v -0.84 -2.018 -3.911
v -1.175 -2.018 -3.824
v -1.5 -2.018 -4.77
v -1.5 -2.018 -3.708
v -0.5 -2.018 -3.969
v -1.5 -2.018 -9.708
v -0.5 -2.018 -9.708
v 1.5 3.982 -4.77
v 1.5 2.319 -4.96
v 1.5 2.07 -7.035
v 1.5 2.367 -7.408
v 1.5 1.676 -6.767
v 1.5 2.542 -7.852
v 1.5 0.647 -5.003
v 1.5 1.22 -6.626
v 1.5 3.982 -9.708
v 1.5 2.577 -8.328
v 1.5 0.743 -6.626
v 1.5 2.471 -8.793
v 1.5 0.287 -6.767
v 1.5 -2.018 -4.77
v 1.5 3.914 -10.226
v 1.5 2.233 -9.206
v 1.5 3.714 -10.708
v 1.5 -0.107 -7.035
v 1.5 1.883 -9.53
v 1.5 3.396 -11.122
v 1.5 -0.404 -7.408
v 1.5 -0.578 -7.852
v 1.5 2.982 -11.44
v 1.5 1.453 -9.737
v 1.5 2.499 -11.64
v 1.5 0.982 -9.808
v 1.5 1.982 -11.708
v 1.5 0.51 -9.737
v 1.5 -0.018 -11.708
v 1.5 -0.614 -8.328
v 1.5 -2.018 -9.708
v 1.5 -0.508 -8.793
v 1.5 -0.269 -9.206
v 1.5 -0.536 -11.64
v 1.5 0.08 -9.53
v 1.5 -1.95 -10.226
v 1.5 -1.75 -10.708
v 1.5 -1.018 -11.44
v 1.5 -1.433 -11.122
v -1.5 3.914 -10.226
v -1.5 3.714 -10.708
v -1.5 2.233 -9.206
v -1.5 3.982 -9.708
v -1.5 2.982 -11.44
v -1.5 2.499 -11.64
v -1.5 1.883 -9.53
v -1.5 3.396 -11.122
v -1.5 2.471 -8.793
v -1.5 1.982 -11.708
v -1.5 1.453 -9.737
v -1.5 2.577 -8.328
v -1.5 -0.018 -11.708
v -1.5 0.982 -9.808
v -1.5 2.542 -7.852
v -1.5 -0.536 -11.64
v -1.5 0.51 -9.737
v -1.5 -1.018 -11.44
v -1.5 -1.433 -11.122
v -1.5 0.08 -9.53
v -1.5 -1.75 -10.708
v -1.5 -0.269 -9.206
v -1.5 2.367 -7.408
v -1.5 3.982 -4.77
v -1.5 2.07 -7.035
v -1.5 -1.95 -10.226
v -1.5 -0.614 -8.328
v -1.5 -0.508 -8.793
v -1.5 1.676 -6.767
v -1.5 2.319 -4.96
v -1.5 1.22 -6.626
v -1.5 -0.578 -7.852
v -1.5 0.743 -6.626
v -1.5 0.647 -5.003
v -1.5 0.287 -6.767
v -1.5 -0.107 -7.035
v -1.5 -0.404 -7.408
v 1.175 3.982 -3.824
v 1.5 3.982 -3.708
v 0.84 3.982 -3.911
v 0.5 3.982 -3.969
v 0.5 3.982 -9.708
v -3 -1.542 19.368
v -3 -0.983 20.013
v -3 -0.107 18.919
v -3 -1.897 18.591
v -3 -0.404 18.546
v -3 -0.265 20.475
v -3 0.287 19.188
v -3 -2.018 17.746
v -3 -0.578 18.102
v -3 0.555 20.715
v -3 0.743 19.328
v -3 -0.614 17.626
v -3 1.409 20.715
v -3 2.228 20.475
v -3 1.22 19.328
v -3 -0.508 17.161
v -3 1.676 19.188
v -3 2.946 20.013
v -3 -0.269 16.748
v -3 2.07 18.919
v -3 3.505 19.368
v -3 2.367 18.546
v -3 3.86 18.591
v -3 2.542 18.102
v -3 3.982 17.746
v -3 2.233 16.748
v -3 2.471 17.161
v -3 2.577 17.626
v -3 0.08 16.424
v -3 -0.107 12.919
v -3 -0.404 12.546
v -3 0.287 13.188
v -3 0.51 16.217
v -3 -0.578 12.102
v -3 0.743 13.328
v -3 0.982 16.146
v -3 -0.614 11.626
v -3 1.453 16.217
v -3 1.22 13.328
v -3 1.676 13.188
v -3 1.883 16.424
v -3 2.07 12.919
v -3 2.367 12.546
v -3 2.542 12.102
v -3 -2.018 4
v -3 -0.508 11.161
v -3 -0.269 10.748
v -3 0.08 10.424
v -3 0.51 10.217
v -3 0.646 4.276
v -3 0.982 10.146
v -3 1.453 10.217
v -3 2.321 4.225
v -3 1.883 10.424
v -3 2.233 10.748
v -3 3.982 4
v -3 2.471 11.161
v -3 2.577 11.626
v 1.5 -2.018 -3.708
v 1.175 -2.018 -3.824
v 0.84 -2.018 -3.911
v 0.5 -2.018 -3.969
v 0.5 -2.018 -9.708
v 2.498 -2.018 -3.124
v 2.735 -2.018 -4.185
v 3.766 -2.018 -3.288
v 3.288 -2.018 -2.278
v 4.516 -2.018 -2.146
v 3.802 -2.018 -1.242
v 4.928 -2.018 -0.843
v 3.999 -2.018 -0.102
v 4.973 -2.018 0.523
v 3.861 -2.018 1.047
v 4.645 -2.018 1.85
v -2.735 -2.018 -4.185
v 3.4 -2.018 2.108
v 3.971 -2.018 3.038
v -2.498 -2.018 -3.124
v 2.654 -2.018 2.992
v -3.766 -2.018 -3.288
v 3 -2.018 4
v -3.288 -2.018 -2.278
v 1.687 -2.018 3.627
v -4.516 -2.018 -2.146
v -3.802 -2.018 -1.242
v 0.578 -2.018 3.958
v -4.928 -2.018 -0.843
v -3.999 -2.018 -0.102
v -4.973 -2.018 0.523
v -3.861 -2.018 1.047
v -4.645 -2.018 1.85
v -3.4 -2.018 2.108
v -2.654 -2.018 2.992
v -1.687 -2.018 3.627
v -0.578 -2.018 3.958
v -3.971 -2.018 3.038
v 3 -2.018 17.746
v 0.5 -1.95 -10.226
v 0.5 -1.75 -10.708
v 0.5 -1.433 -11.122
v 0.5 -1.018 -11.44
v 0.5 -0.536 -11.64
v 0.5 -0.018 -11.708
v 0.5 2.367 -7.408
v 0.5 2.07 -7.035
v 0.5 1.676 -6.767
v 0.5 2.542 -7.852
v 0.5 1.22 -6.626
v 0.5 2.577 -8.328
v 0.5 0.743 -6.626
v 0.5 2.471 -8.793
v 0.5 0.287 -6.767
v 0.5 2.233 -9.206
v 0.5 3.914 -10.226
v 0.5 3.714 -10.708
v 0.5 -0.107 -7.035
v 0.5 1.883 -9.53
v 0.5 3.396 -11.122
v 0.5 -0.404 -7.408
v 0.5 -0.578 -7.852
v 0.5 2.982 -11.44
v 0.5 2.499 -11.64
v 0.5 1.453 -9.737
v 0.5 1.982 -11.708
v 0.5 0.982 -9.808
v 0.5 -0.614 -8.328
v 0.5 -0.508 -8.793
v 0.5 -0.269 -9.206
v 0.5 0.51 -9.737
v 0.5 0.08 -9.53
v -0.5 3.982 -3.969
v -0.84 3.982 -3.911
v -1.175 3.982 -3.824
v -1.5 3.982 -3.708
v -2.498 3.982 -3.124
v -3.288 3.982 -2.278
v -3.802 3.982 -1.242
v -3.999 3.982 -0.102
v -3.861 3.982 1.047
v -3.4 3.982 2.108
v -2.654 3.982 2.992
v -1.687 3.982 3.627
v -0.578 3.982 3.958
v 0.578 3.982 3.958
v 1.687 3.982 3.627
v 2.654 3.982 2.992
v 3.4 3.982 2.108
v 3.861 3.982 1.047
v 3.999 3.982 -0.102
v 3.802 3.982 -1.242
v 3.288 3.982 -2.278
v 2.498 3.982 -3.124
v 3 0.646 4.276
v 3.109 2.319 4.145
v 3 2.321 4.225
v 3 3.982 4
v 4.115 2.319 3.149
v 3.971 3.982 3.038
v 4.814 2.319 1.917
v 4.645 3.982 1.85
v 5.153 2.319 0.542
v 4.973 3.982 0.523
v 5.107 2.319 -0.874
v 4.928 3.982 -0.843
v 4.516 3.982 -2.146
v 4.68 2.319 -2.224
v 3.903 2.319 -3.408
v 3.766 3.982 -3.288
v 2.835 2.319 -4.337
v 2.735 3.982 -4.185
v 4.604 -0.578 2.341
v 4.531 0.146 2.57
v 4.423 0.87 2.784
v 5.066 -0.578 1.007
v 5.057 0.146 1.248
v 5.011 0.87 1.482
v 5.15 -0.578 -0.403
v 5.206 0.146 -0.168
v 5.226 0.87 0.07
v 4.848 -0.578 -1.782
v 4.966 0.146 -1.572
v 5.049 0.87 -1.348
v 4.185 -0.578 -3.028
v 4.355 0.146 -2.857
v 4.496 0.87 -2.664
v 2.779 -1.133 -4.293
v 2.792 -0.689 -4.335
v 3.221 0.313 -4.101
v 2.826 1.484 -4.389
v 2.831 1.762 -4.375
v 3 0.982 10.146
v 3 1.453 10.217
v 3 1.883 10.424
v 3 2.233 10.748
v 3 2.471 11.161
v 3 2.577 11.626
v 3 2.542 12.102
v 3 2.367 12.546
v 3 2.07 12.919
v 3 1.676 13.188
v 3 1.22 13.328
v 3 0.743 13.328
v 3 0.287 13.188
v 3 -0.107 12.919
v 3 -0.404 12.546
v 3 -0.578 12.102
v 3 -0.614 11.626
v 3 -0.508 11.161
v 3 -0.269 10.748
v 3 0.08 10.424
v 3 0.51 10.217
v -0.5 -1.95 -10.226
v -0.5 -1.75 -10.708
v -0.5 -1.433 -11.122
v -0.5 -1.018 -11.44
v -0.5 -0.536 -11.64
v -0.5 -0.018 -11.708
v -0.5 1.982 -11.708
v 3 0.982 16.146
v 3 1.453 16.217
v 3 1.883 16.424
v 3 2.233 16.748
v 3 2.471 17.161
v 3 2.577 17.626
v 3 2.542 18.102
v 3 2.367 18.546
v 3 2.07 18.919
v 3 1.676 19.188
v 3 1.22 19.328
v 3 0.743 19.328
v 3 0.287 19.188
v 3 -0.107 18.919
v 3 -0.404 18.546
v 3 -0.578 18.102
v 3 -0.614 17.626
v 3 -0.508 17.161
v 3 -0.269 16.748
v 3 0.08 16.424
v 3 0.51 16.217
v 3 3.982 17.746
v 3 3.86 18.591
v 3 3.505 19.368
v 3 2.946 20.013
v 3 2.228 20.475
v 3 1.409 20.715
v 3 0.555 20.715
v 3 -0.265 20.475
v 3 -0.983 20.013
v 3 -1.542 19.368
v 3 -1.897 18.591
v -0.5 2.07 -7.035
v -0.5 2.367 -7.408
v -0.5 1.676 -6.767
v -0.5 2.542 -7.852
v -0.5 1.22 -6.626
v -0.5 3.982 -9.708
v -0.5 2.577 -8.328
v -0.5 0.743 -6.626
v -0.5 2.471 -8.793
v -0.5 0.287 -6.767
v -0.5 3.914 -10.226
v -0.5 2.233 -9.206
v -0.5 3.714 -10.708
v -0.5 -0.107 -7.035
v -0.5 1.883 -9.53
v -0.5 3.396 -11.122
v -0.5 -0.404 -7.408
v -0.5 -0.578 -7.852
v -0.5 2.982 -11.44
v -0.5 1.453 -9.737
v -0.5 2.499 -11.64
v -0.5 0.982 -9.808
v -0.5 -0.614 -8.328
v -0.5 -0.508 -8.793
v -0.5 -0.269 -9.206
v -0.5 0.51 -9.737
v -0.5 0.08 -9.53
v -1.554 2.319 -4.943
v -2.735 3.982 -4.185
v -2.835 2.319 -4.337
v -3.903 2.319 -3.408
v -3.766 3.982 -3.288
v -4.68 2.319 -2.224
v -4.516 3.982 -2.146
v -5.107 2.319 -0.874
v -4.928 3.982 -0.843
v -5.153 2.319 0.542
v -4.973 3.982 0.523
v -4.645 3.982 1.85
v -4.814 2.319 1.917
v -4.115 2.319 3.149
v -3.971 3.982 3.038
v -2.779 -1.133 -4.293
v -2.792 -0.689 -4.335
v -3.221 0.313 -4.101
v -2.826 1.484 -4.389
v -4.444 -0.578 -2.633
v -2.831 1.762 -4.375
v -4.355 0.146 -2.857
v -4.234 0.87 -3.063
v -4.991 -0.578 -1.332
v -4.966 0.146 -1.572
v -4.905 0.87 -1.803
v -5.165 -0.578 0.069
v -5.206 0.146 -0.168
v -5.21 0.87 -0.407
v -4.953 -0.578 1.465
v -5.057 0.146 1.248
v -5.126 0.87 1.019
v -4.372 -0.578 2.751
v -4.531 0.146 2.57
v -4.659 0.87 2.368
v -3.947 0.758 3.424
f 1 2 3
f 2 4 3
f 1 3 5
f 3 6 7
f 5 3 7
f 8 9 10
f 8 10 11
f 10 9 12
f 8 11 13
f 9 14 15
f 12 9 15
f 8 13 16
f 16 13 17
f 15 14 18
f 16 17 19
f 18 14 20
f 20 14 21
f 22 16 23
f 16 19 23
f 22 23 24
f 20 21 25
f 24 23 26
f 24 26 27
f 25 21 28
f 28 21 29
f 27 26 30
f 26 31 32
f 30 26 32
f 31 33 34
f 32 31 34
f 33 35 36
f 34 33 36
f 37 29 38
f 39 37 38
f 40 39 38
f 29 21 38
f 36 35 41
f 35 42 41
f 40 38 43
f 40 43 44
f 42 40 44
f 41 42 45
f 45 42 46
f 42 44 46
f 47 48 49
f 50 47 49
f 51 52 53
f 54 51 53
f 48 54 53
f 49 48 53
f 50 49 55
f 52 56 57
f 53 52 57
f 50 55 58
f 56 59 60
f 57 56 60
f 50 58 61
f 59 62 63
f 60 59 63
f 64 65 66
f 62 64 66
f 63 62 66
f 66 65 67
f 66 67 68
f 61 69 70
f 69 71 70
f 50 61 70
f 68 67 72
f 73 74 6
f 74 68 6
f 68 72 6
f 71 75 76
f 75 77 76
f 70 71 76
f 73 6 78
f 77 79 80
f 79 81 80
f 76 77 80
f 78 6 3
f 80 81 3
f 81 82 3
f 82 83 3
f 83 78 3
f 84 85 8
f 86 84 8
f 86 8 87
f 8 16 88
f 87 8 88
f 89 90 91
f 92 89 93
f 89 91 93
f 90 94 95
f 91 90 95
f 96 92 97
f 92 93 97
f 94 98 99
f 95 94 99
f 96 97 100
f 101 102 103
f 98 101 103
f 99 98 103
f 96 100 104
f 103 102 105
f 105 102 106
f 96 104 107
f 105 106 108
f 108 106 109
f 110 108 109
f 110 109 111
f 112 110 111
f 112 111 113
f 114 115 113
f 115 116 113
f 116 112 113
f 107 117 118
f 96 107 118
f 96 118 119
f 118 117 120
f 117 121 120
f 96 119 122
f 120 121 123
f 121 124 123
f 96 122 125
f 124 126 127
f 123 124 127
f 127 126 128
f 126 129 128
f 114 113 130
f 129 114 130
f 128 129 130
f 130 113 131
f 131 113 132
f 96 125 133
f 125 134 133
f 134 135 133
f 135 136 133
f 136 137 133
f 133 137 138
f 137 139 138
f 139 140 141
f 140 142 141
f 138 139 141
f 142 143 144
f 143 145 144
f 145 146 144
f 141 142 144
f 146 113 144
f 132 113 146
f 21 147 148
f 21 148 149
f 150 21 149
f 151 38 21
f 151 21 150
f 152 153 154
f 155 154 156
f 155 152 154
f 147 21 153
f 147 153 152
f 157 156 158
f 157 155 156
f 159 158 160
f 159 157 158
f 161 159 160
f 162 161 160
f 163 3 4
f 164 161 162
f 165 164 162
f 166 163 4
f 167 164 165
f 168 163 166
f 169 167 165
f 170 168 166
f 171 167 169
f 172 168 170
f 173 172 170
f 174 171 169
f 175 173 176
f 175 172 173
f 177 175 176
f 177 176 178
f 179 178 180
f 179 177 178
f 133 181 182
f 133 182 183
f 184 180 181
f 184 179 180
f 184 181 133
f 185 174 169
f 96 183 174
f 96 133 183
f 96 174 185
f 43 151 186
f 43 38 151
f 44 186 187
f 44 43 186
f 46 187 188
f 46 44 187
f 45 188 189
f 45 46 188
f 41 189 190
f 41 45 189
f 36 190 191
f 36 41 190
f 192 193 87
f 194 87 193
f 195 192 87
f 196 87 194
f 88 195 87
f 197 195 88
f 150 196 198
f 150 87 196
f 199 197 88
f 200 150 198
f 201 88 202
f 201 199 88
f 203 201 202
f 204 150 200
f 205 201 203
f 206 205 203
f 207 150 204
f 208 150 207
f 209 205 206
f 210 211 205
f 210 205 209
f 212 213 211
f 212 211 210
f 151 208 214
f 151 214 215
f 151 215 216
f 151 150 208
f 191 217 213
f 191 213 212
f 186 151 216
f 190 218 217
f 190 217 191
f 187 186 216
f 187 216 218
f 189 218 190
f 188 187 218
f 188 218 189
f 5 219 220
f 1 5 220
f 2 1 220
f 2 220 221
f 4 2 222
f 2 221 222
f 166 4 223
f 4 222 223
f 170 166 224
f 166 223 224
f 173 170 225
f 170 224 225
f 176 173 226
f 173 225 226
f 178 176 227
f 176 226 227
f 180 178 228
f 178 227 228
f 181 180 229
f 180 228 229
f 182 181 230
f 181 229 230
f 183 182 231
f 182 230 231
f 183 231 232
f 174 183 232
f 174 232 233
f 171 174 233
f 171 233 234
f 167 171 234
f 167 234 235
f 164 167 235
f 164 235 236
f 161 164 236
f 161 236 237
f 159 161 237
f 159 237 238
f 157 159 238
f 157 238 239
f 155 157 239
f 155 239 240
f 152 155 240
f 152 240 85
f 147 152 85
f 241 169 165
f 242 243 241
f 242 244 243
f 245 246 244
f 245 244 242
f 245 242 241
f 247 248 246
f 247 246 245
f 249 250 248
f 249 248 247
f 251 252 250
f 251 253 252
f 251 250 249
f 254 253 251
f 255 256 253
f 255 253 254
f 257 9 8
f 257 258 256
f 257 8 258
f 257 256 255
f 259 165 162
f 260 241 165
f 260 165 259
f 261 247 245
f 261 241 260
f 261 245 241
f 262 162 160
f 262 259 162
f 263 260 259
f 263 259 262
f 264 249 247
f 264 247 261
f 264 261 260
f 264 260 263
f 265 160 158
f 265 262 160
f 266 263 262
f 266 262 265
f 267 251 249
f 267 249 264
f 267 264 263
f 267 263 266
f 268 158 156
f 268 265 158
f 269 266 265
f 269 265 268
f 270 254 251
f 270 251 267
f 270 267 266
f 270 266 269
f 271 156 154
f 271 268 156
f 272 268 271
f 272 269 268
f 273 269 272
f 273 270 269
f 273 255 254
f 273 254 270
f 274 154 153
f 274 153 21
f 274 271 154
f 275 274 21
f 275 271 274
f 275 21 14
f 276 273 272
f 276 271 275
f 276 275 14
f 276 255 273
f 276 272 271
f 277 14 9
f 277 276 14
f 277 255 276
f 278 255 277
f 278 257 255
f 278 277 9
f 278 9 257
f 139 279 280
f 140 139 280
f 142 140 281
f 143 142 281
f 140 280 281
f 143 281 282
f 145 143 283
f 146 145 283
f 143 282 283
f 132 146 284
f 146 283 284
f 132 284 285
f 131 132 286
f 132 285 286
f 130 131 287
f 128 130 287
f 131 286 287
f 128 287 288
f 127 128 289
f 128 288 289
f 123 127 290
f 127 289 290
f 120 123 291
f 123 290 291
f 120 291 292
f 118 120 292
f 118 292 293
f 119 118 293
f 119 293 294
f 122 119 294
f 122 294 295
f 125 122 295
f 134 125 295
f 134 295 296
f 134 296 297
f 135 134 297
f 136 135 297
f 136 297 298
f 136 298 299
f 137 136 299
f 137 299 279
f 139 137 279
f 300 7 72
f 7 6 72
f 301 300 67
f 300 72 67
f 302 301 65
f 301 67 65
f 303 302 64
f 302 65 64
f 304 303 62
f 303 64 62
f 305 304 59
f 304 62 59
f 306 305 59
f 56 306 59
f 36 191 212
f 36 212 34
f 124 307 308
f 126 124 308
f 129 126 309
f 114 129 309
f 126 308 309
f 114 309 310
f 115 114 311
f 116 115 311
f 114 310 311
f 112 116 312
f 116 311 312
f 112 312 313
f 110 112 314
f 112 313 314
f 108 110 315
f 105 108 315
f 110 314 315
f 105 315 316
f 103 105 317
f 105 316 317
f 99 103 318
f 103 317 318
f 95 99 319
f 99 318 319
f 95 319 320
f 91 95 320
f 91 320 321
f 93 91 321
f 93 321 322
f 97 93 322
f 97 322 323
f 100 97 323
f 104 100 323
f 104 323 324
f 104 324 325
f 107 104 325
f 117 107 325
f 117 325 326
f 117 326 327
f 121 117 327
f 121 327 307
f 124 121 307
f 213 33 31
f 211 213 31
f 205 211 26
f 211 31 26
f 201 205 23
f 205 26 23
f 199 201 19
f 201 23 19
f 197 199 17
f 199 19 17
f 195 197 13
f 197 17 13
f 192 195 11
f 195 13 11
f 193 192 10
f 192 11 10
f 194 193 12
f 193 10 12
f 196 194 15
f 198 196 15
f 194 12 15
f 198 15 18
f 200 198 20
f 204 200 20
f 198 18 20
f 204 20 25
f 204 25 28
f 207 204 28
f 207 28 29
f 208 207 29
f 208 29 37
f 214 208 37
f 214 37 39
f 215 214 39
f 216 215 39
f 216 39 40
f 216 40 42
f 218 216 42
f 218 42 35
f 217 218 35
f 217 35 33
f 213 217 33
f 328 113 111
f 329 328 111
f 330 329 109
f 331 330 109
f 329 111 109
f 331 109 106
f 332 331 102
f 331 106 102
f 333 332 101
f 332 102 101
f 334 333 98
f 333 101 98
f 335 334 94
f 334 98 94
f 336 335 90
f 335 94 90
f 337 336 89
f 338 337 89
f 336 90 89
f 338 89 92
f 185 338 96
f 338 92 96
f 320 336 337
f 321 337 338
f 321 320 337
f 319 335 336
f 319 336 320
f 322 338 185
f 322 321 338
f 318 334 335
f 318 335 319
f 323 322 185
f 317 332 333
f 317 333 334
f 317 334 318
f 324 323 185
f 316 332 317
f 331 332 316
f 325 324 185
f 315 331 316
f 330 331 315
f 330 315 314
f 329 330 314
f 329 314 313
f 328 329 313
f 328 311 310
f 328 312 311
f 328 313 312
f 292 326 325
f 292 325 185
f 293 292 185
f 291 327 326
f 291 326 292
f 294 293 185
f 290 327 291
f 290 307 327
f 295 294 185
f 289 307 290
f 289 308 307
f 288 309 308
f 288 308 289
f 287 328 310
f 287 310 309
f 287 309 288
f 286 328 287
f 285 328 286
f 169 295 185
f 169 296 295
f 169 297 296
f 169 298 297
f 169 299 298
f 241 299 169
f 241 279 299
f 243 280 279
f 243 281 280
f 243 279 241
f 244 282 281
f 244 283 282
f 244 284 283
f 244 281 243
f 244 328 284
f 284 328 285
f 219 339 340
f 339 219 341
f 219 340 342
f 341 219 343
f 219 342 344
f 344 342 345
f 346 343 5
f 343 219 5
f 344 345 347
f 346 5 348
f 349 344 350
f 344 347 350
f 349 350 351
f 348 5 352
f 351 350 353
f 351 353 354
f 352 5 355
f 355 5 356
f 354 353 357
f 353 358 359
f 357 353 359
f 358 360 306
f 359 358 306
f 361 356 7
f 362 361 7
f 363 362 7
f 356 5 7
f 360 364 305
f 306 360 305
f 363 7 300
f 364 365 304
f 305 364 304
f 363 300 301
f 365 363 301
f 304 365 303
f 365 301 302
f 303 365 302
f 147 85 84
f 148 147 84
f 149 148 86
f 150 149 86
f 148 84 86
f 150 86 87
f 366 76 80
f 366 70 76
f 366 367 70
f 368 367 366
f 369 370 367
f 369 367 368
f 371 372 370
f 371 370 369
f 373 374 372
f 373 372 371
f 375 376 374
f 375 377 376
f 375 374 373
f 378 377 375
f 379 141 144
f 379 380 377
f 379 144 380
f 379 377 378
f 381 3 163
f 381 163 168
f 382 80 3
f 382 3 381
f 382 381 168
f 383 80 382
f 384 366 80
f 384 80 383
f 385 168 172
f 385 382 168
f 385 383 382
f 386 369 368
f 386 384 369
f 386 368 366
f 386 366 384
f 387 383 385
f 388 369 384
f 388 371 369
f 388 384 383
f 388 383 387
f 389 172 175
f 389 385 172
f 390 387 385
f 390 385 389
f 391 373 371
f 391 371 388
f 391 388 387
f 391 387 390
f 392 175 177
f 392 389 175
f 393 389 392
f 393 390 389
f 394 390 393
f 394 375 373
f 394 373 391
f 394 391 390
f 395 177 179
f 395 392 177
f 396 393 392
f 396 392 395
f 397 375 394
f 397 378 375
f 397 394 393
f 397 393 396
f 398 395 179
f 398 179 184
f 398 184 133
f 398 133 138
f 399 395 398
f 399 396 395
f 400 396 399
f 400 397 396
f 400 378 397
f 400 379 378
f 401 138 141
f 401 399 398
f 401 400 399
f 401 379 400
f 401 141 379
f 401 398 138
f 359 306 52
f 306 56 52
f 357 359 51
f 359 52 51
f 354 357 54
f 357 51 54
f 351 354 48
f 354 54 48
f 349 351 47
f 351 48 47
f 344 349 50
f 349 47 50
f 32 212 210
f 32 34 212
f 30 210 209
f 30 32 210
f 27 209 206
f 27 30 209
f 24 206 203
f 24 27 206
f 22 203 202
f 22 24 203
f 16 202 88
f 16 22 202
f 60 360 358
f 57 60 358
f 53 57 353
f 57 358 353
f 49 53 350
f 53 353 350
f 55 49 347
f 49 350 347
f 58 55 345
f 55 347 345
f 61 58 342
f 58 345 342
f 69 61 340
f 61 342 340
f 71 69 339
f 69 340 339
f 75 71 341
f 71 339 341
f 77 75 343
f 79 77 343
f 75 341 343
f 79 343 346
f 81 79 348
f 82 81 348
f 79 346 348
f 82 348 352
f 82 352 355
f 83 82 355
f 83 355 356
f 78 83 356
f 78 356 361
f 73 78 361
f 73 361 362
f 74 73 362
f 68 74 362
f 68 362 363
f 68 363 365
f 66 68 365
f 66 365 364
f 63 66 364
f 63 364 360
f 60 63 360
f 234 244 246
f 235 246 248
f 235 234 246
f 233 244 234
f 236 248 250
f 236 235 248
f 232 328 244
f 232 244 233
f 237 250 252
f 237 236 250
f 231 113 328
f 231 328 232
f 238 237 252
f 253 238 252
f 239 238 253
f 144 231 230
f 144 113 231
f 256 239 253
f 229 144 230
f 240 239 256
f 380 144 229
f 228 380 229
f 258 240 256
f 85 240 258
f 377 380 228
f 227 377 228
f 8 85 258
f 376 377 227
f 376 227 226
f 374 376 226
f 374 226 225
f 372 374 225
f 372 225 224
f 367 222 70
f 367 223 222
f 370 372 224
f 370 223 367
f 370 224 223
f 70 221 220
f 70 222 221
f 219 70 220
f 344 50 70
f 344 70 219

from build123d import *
from OCP.BRepAlgoAPI import BRepAlgoAPI_Cut
from OCP.TopTools import TopTools_ListOfShape

# Parameters (mm, degrees)
CUT_EXTRUDE_1_DEPTH      = 9.395352378
CUT_EXTRUDE_1_DEPTH_BACK = 9.395352378
SKETCH_2_W               = 3
SKETCH_2_H               = 3.541131468
EXTRUDE_START            = -2.0183
EXTRUDE_1_DEPTH          = 6
EXTRUDE_2_DEPTH          = 3
EXTRUDE_2_DEPTH_BACK     = 3
SKETCH_6_R               = 1.6
CUT_EXTRUDE_2_DEPTH      = 23.66980552
SKETCH_7_R               = 4
CUT_EXTRUDE_3_DEPTH      = 23.219551454
FILLET_1_R               = 2


with BuildPart() as part:
    # 草图1 → 旋转1 (revolve)
    with BuildSketch(Plane.XY, mode=Mode.PRIVATE) as revolve_1_sk:
        with BuildLine():
            Line((4, 3.981699636), (4, -2.018300364))
            Line((4, -2.018300364), (5, -2.018300364))
            ThreePointArc((5, -2.018300364), (5.226280067, 0.981699636), (5, 3.981699636))
            Line((5, 3.981699636), (4, 3.981699636))
        make_face()
    revolve(revolve_1_sk.sketch.rotate(Axis((0, -4.923271421, 0), (0, 1, 0)), 90), axis=Axis((0, -4.923271421, 0), (0, 1, 0)))

    # 草图2 → 切除-拉伸1 (cut, two sides: drawn at the far end of the back side and taken through both)
    with BuildSketch(Plane(origin=(0, 0, 0), x_dir=(1, 0, 0), z_dir=(0, 1, 0)).offset(-CUT_EXTRUDE_1_DEPTH_BACK)):
        with Locations((0, 5.060025588)):
            Rectangle(SKETCH_2_W, SKETCH_2_H)
    extrude(amount=CUT_EXTRUDE_1_DEPTH + CUT_EXTRUDE_1_DEPTH_BACK, mode=Mode.SUBTRACT)

    # 草图3 → 凸台-拉伸1 (add)
    with BuildSketch(Plane(origin=(0, 0, 0), x_dir=(1, 0, 0), z_dir=(0, 1, 0)).offset(EXTRUDE_START)):
        Polygon((-1.5, 3.708099244), (-0.5, 3.708099244), (-0.5, 11.708099244), (-1.5, 11.708099244), (-1.5, 4.981969012), align=None)
        Polygon((1.5, 11.708099244), (1.5, 4.981969012), (1.5, 3.708099244), (0.5, 3.708099244), (0.5, 11.708099244), align=None)
    extrude(amount=EXTRUDE_1_DEPTH)

    # 草图5 → 凸台-拉伸2 (add, two sides: drawn at the far end of the back side and taken through both)
    with BuildSketch(Plane(origin=(0, 0, 0), x_dir=(0, 0, -1), z_dir=(1, 0, 0)).offset(-EXTRUDE_2_DEPTH_BACK)):
        with BuildLine():
            Line((-3.745950378, 3.981699636), (-17.745950378, 3.981699636))
            ThreePointArc((-17.745950378, 3.981699636), (-20.745950378, 0.981699636), (-17.745950378, -2.018300364))
            Line((-17.745950378, -2.018300364), (-3.745950378, -2.018300364))
            Line((-3.745950378, -2.018300364), (-3.745950378, 3.981699636))
        make_face()
    extrude(amount=EXTRUDE_2_DEPTH + EXTRUDE_2_DEPTH_BACK)

    # 草图6 → 切除-拉伸2 (cut, through all)
    with BuildSketch(Plane(origin=(3, 0, 0), x_dir=(0, 0, -1), z_dir=(1, 0, 0))):
        with Locations((-17.745950378, 0.981699636)):
            Circle(SKETCH_6_R)
        with Locations((8.208099244, 0.981699636)):
            Circle(SKETCH_6_R)
        with Locations((-11.745950378, 0.981699636)):
            Circle(SKETCH_6_R)
    extrude(amount=-CUT_EXTRUDE_2_DEPTH, mode=Mode.SUBTRACT)


with BuildPart() as cut_extrude_3_tool:
    # 草图7 → 切除-拉伸3 (new, through all)
    with BuildSketch(Plane(origin=(0, 3.981699636, 0), x_dir=(1, 0, 0), z_dir=(0, 1, 0))):
        Circle(SKETCH_7_R)
    extrude(amount=-CUT_EXTRUDE_3_DEPTH)


with BuildPart() as part_1:
    add(part.part)

    # 切除-拉伸3: cut by cut_extrude_3_tool, with a tolerance
    cut_extrude_3_stock = TopTools_ListOfShape()
    cut_extrude_3_stock.Append(part_1.part.wrapped)
    cut_extrude_3_tools = TopTools_ListOfShape()
    cut_extrude_3_tools.Append(cut_extrude_3_tool.part.wrapped)
    cut_extrude_3_cut = BRepAlgoAPI_Cut()
    cut_extrude_3_cut.SetArguments(cut_extrude_3_stock)
    cut_extrude_3_cut.SetTools(cut_extrude_3_tools)
    cut_extrude_3_cut.SetFuzzyValue(0.00001)
    cut_extrude_3_cut.Build()
    add(Compound.cast(cut_extrude_3_cut.Shape()).solids(), mode=Mode.REPLACE)

    # 圆角1
    fillet_1_edges = [part_1.edges().sort_by_distance(p)[0] for p in [
        (-1, -2.0183, -11.708099244),
        (-1, 3.9817, -11.708099244),
        (1, -2.0183, -11.708099244),
        (1, 3.9817, -11.708099244),
    ]]
    fillet(fillet_1_edges, radius=FILLET_1_R)


solid = part_1.part
